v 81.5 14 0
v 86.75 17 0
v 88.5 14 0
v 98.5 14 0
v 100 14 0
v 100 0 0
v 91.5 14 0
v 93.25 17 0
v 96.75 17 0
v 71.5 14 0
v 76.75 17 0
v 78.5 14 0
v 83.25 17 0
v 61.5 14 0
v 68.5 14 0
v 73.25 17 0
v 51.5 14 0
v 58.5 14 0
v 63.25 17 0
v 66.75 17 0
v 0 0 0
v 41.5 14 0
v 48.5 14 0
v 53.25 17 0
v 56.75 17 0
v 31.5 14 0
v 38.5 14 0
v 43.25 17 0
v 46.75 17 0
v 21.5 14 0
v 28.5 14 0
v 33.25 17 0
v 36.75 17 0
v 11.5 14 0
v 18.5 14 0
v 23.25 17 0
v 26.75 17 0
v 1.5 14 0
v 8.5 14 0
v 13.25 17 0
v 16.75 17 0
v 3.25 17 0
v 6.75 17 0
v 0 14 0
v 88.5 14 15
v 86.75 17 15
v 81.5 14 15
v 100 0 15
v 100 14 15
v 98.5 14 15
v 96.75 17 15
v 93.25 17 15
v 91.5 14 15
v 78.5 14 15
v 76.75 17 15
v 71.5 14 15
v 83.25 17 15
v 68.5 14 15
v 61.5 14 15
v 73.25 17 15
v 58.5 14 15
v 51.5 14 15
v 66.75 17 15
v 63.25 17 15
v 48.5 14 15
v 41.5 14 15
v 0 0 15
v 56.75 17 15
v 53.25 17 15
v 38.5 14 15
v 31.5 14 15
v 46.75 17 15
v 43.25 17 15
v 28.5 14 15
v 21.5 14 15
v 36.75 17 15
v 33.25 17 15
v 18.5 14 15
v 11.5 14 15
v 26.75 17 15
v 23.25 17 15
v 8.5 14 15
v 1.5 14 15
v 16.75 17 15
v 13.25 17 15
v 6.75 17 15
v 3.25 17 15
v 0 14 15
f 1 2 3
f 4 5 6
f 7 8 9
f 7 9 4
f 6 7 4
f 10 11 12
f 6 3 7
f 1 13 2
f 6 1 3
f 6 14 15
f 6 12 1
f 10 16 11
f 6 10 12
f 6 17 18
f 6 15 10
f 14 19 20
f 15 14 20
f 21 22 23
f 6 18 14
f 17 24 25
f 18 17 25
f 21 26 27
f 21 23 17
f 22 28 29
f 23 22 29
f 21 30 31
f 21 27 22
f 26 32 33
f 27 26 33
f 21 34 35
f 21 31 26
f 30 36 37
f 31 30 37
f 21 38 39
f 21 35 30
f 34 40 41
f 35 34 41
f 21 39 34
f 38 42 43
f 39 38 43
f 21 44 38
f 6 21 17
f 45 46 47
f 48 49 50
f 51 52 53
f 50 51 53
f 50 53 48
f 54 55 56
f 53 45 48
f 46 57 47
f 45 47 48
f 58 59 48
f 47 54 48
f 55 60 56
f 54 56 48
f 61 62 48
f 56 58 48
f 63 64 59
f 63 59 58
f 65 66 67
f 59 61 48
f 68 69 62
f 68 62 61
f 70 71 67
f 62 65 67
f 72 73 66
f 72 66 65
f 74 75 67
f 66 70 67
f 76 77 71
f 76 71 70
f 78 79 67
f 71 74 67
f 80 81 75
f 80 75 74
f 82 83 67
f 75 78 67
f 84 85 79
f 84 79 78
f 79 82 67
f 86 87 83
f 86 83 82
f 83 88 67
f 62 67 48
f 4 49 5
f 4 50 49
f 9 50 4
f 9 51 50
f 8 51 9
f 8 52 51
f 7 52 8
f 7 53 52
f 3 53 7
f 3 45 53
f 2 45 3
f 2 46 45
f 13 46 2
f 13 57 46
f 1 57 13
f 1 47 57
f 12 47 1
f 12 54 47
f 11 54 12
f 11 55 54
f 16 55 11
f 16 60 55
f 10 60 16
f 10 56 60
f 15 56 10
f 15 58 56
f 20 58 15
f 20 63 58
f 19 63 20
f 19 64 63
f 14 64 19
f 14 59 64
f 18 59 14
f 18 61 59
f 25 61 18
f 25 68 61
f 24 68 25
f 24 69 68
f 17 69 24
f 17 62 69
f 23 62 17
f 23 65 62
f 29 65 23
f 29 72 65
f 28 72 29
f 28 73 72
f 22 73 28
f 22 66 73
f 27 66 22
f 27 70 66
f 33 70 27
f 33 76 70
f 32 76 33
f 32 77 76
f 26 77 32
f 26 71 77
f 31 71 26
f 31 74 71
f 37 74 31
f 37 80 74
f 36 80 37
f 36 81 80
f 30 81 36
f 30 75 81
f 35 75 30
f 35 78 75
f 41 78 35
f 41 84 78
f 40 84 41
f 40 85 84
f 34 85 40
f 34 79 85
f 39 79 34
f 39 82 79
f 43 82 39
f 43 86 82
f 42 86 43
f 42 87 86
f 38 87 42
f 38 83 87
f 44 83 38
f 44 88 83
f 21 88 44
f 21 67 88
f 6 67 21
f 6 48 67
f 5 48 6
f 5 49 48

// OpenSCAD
$fn = 32;

// ----------------------------------------------------------------------
// Gear rack: 10 teeth, pitch 10 mm
// ----------------------------------------------------------------------

// --- parameters (mm) ---
teeth = 10;               // number of teeth
pitch = 10;               // tooth pitch, X
root_w = 7;               // tooth width at the root
tip_w = 3.5;              // tooth width at the tip
base_h = 14;              // rack body height, Y
tooth_h = 3;              // tooth height above the body
plate_t = 15;             // rack width, Z (extrusion height)

rack_l = teeth * pitch;  // overall length
total_h = base_h + tooth_h;  // overall height

profile = [[0, 0], [100, 0], [100, 14], [98.5, 14], [96.75, 17], [93.25, 17], [91.5, 14], [88.5, 14], [86.75, 17], [83.25, 17], [81.5, 14], [78.5, 14], [76.75, 17], [73.25, 17], [71.5, 14], [68.5, 14], [66.75, 17], [63.25, 17], [61.5, 14], [58.5, 14], [56.75, 17], [53.25, 17], [51.5, 14], [48.5, 14], [46.75, 17], [43.25, 17], [41.5, 14], [38.5, 14], [36.75, 17], [33.25, 17], [31.5, 14], [28.5, 14], [26.75, 17], [23.25, 17], [21.5, 14], [18.5, 14], [16.75, 17], [13.25, 17], [11.5, 14], [8.5, 14], [6.75, 17], [3.25, 17], [1.5, 14], [0, 14]];  // primary outline, 44 points, counter clockwise

// --- the one profile operation ---
linear_extrude(height = plate_t) polygon(points = profile);
